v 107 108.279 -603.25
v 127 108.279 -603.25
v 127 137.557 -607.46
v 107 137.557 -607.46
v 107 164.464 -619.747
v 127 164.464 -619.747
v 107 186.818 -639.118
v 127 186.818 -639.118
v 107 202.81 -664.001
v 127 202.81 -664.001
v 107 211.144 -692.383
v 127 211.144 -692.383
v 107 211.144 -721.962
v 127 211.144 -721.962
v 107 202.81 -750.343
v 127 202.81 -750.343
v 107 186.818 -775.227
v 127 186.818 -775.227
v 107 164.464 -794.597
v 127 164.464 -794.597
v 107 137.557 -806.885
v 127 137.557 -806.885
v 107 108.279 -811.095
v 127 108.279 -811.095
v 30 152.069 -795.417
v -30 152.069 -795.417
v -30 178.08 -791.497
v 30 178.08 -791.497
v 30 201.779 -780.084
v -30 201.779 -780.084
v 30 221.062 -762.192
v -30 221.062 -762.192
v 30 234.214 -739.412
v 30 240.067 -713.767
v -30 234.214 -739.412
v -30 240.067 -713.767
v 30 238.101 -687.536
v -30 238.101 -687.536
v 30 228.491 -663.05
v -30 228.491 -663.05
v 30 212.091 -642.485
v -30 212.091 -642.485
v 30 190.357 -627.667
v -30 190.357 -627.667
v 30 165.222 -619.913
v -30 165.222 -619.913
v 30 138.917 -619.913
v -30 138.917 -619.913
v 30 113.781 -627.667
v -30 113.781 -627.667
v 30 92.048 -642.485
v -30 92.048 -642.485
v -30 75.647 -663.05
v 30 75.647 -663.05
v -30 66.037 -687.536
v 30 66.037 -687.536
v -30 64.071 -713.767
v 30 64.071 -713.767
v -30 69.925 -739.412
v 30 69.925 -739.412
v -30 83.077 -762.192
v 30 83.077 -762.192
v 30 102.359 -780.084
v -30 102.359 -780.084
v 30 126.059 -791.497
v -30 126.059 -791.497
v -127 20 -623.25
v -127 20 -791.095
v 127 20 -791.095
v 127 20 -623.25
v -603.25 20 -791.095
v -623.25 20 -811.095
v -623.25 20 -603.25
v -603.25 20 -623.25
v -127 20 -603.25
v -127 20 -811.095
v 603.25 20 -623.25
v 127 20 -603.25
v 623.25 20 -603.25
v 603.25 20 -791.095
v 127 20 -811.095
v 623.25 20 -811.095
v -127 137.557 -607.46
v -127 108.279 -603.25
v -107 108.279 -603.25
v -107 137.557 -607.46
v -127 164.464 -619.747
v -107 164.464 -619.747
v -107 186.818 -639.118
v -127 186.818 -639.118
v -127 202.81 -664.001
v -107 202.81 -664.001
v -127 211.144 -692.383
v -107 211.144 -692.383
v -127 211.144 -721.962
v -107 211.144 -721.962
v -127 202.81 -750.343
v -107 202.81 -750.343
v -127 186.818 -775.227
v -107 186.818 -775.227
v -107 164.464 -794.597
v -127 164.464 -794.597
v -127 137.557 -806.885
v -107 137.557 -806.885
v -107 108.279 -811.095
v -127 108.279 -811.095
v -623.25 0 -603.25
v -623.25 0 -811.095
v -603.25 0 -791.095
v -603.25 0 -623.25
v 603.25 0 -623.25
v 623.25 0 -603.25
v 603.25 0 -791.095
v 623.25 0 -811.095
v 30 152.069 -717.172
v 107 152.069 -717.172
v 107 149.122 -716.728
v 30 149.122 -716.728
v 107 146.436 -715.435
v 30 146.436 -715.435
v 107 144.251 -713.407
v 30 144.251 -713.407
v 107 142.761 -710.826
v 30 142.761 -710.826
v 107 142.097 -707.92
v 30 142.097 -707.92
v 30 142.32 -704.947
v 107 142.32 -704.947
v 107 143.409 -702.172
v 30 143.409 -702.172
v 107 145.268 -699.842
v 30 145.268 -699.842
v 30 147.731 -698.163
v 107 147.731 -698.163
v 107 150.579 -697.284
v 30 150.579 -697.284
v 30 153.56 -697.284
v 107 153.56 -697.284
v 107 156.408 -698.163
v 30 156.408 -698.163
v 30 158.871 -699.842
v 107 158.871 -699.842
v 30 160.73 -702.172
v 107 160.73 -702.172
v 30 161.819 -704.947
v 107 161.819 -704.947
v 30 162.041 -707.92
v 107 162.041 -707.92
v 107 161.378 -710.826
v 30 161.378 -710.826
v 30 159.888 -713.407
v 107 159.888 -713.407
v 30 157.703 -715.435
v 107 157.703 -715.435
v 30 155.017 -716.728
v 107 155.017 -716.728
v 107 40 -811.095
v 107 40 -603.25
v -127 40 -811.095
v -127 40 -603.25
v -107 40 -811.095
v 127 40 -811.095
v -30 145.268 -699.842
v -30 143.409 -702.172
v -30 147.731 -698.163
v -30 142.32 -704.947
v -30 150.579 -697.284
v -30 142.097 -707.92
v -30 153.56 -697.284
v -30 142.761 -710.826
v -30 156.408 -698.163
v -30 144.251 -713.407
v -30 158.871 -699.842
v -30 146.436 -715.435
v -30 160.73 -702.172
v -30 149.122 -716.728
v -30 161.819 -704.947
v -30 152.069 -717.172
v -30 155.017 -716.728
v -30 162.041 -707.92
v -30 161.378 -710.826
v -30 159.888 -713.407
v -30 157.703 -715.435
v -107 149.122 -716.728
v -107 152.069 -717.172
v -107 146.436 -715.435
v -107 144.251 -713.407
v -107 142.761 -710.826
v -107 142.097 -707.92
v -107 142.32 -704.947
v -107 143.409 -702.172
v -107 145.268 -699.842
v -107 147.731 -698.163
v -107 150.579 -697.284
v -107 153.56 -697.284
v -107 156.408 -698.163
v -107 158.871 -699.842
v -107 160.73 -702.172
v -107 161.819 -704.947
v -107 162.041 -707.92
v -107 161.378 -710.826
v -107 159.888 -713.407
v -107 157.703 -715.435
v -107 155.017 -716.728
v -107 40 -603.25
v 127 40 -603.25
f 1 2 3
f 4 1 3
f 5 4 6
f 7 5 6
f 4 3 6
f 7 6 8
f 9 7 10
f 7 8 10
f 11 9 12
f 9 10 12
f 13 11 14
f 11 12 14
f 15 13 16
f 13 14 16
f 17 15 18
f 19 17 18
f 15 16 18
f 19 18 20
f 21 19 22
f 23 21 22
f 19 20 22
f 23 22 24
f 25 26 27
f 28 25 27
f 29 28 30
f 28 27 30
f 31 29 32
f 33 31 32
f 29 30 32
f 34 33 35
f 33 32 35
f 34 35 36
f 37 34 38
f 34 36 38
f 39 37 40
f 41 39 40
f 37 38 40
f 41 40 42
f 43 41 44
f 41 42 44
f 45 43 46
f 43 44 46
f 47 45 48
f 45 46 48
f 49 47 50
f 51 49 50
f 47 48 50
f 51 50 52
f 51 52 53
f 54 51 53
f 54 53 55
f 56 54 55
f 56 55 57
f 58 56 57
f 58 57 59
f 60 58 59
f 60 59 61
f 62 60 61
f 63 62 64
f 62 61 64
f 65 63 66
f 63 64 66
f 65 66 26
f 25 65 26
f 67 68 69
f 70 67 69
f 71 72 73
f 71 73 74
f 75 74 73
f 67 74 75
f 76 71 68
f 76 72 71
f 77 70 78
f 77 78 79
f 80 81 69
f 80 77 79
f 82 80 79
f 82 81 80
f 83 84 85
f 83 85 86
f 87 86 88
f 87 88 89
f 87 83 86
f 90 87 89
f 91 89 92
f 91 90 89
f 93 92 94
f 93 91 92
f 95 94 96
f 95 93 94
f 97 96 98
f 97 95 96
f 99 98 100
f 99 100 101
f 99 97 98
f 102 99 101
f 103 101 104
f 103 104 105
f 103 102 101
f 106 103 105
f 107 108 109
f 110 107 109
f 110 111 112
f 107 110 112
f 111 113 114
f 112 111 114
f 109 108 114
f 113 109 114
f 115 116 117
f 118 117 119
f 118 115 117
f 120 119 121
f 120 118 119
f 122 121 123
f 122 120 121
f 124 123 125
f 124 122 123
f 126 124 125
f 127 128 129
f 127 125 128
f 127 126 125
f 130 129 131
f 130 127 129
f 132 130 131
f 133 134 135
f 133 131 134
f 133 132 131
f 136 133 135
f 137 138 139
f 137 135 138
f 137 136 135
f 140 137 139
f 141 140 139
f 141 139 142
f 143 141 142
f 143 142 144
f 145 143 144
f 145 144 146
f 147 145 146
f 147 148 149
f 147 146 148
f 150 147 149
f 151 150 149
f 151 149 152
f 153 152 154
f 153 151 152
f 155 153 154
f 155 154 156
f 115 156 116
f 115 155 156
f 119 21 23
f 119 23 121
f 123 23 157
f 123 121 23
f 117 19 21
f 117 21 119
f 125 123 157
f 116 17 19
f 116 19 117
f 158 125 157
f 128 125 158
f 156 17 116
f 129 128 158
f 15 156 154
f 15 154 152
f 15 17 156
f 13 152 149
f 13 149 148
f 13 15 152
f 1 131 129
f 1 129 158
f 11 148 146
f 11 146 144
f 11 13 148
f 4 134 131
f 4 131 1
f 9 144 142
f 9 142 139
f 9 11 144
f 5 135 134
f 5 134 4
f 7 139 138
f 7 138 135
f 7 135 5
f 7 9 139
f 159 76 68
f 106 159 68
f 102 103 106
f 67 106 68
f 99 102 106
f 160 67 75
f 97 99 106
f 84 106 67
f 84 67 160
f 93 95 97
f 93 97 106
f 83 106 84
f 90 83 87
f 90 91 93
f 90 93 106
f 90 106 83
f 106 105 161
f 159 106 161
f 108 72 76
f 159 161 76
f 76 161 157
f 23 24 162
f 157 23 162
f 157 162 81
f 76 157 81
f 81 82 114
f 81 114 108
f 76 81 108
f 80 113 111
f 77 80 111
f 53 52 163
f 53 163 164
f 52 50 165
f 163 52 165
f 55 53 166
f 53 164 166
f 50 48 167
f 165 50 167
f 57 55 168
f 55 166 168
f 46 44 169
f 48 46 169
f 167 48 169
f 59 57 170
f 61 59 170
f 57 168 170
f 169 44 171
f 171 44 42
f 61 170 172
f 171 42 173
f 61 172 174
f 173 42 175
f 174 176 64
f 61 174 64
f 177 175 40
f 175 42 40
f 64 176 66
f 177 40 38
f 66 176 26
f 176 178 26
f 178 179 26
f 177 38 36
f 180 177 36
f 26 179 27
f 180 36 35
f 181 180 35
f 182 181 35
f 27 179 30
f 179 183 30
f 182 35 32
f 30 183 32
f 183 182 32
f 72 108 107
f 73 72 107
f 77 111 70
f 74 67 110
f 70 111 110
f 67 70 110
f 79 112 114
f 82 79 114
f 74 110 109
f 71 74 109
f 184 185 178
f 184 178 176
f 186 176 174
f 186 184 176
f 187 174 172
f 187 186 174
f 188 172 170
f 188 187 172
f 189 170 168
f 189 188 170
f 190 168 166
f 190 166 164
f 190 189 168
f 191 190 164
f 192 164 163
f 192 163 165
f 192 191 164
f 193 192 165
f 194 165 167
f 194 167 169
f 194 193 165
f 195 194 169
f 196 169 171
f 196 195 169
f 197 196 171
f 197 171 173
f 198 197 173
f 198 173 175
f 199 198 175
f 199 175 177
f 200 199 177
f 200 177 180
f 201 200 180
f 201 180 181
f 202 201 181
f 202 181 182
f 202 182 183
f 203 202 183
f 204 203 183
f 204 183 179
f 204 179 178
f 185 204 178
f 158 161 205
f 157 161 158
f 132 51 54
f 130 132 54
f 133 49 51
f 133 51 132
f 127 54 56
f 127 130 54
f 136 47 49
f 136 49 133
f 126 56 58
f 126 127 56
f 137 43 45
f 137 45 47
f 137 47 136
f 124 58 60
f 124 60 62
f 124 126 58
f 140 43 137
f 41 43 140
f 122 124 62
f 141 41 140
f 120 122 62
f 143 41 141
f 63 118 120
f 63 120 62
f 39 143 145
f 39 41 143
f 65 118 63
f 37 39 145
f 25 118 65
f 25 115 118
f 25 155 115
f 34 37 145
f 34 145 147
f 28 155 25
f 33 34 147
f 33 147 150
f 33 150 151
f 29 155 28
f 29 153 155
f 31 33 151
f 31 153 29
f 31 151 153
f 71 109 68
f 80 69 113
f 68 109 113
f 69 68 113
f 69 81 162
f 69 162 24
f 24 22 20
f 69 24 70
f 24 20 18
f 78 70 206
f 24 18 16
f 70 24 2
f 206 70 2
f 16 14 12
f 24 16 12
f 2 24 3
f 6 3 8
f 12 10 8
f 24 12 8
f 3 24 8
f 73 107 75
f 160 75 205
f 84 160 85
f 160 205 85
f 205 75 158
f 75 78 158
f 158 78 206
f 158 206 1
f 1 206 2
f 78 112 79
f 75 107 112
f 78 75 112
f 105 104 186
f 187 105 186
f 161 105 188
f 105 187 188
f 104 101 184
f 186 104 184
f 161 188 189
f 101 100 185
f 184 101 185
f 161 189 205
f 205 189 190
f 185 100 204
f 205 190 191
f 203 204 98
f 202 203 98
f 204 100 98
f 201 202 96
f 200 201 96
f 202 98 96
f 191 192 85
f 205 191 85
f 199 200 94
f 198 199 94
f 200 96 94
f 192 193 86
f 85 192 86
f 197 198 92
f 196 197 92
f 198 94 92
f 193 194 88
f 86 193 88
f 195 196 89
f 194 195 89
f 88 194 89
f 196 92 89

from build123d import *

# Parameters (mm, degrees)
BOSS_EXTRUDE1_DEPTH      = 20
SKETCH2_W                = 254
SKETCH2_H                = 207.844806097
BOSS_EXTRUDE2_DEPTH      = 20
SKETCH3_R                = 10
BOSS_EXTRUDE3_DEPTH      = 20
BOSS_EXTRUDE4_DEPTH      = 30
BOSS_EXTRUDE4_DEPTH_BACK = 30
SKETCH4_R                = 88.24460582
SKETCH5_R                = 10
BOSS_EXTRUDE5_DEPTH      = 254


with BuildPart() as part:
    # Sketch1 → Boss-Extrude1 (new body)
    with BuildSketch(Plane(origin=(0, 0, 0), x_dir=(1, 0, 0), z_dir=(0, 1, 0))):
        Polygon((-623.25, 811.094806097), (-623.25, 623.25), (-603.25, 623.25), (-603.25, 791.094806097), (603.25, 791.094806097), (603.25, 623.25), (623.25, 623.25), (623.25, 811.094806097), align=None)
        Polygon((-623.25, 623.25), (-623.25, 603.25), (-603.25, 603.25), (603.25, 603.25), (623.25, 603.25), (623.25, 623.25), (603.25, 623.25), (-603.25, 623.25), align=None)
    extrude(amount=BOSS_EXTRUDE1_DEPTH)

    # Sketch2 → Boss-Extrude2 (add)
    with BuildSketch(Plane(origin=(0, 20, 0), x_dir=(1, 0, 0), z_dir=(0, 1, 0))):
        with Locations((0, 707.172403048)):
            Rectangle(SKETCH2_W, SKETCH2_H)
    extrude(amount=BOSS_EXTRUDE2_DEPTH)

    # Sketch3 → Boss-Extrude3 (add)
    with BuildSketch(Plane.ZY.offset(127)):
        with BuildLine():
            Line((-811.094806097, 40), (-603.25, 40))
            Line((-603.25, 40), (-603.25, 108.279126424))
            ThreePointArc((-603.25, 108.279126424), (-707.172403048, 212.201529473), (-811.094806097, 108.279126424))
            Line((-811.094806097, 108.279126424), (-811.094806097, 40))
        make_face()
        with Locations((-707.172403048, 152.06935065)):
            Circle(SKETCH3_R, mode=Mode.SUBTRACT)
    boss_extrude3 = extrude(amount=-BOSS_EXTRUDE3_DEPTH)

    # Mirror1: Boss-Extrude3 across plane
    add(boss_extrude3.mirror(Plane(origin=(0, 0, 0), x_dir=(0, 0, 1), z_dir=(1, 0, 0))))



with BuildPart() as body_2:
    # Sketch4 → Boss-Extrude4 (new, two sides: drawn at the far end of the back side and taken through both)
    with BuildSketch(Plane(origin=(0, 0, 0), x_dir=(0, 0, -1), z_dir=(1, 0, 0)).offset(-BOSS_EXTRUDE4_DEPTH_BACK)):
        with Locations((707.172403048, 152.06935065)):
            Circle(SKETCH4_R)
    extrude(amount=BOSS_EXTRUDE4_DEPTH + BOSS_EXTRUDE4_DEPTH_BACK)


with BuildPart() as part_1:
    add(part.part)

    add(body_2.part)  # Boss-Extrude5 merges body 2
    # Sketch5 → Boss-Extrude5 (add)
    with BuildSketch(Plane.ZY.offset(127)):
        with Locations(Location((-707.172403048, 152.06935065, 0), (0, 0, 180))):
            Circle(SKETCH5_R)
    extrude(amount=-BOSS_EXTRUDE5_DEPTH)


solid = part_1.part
